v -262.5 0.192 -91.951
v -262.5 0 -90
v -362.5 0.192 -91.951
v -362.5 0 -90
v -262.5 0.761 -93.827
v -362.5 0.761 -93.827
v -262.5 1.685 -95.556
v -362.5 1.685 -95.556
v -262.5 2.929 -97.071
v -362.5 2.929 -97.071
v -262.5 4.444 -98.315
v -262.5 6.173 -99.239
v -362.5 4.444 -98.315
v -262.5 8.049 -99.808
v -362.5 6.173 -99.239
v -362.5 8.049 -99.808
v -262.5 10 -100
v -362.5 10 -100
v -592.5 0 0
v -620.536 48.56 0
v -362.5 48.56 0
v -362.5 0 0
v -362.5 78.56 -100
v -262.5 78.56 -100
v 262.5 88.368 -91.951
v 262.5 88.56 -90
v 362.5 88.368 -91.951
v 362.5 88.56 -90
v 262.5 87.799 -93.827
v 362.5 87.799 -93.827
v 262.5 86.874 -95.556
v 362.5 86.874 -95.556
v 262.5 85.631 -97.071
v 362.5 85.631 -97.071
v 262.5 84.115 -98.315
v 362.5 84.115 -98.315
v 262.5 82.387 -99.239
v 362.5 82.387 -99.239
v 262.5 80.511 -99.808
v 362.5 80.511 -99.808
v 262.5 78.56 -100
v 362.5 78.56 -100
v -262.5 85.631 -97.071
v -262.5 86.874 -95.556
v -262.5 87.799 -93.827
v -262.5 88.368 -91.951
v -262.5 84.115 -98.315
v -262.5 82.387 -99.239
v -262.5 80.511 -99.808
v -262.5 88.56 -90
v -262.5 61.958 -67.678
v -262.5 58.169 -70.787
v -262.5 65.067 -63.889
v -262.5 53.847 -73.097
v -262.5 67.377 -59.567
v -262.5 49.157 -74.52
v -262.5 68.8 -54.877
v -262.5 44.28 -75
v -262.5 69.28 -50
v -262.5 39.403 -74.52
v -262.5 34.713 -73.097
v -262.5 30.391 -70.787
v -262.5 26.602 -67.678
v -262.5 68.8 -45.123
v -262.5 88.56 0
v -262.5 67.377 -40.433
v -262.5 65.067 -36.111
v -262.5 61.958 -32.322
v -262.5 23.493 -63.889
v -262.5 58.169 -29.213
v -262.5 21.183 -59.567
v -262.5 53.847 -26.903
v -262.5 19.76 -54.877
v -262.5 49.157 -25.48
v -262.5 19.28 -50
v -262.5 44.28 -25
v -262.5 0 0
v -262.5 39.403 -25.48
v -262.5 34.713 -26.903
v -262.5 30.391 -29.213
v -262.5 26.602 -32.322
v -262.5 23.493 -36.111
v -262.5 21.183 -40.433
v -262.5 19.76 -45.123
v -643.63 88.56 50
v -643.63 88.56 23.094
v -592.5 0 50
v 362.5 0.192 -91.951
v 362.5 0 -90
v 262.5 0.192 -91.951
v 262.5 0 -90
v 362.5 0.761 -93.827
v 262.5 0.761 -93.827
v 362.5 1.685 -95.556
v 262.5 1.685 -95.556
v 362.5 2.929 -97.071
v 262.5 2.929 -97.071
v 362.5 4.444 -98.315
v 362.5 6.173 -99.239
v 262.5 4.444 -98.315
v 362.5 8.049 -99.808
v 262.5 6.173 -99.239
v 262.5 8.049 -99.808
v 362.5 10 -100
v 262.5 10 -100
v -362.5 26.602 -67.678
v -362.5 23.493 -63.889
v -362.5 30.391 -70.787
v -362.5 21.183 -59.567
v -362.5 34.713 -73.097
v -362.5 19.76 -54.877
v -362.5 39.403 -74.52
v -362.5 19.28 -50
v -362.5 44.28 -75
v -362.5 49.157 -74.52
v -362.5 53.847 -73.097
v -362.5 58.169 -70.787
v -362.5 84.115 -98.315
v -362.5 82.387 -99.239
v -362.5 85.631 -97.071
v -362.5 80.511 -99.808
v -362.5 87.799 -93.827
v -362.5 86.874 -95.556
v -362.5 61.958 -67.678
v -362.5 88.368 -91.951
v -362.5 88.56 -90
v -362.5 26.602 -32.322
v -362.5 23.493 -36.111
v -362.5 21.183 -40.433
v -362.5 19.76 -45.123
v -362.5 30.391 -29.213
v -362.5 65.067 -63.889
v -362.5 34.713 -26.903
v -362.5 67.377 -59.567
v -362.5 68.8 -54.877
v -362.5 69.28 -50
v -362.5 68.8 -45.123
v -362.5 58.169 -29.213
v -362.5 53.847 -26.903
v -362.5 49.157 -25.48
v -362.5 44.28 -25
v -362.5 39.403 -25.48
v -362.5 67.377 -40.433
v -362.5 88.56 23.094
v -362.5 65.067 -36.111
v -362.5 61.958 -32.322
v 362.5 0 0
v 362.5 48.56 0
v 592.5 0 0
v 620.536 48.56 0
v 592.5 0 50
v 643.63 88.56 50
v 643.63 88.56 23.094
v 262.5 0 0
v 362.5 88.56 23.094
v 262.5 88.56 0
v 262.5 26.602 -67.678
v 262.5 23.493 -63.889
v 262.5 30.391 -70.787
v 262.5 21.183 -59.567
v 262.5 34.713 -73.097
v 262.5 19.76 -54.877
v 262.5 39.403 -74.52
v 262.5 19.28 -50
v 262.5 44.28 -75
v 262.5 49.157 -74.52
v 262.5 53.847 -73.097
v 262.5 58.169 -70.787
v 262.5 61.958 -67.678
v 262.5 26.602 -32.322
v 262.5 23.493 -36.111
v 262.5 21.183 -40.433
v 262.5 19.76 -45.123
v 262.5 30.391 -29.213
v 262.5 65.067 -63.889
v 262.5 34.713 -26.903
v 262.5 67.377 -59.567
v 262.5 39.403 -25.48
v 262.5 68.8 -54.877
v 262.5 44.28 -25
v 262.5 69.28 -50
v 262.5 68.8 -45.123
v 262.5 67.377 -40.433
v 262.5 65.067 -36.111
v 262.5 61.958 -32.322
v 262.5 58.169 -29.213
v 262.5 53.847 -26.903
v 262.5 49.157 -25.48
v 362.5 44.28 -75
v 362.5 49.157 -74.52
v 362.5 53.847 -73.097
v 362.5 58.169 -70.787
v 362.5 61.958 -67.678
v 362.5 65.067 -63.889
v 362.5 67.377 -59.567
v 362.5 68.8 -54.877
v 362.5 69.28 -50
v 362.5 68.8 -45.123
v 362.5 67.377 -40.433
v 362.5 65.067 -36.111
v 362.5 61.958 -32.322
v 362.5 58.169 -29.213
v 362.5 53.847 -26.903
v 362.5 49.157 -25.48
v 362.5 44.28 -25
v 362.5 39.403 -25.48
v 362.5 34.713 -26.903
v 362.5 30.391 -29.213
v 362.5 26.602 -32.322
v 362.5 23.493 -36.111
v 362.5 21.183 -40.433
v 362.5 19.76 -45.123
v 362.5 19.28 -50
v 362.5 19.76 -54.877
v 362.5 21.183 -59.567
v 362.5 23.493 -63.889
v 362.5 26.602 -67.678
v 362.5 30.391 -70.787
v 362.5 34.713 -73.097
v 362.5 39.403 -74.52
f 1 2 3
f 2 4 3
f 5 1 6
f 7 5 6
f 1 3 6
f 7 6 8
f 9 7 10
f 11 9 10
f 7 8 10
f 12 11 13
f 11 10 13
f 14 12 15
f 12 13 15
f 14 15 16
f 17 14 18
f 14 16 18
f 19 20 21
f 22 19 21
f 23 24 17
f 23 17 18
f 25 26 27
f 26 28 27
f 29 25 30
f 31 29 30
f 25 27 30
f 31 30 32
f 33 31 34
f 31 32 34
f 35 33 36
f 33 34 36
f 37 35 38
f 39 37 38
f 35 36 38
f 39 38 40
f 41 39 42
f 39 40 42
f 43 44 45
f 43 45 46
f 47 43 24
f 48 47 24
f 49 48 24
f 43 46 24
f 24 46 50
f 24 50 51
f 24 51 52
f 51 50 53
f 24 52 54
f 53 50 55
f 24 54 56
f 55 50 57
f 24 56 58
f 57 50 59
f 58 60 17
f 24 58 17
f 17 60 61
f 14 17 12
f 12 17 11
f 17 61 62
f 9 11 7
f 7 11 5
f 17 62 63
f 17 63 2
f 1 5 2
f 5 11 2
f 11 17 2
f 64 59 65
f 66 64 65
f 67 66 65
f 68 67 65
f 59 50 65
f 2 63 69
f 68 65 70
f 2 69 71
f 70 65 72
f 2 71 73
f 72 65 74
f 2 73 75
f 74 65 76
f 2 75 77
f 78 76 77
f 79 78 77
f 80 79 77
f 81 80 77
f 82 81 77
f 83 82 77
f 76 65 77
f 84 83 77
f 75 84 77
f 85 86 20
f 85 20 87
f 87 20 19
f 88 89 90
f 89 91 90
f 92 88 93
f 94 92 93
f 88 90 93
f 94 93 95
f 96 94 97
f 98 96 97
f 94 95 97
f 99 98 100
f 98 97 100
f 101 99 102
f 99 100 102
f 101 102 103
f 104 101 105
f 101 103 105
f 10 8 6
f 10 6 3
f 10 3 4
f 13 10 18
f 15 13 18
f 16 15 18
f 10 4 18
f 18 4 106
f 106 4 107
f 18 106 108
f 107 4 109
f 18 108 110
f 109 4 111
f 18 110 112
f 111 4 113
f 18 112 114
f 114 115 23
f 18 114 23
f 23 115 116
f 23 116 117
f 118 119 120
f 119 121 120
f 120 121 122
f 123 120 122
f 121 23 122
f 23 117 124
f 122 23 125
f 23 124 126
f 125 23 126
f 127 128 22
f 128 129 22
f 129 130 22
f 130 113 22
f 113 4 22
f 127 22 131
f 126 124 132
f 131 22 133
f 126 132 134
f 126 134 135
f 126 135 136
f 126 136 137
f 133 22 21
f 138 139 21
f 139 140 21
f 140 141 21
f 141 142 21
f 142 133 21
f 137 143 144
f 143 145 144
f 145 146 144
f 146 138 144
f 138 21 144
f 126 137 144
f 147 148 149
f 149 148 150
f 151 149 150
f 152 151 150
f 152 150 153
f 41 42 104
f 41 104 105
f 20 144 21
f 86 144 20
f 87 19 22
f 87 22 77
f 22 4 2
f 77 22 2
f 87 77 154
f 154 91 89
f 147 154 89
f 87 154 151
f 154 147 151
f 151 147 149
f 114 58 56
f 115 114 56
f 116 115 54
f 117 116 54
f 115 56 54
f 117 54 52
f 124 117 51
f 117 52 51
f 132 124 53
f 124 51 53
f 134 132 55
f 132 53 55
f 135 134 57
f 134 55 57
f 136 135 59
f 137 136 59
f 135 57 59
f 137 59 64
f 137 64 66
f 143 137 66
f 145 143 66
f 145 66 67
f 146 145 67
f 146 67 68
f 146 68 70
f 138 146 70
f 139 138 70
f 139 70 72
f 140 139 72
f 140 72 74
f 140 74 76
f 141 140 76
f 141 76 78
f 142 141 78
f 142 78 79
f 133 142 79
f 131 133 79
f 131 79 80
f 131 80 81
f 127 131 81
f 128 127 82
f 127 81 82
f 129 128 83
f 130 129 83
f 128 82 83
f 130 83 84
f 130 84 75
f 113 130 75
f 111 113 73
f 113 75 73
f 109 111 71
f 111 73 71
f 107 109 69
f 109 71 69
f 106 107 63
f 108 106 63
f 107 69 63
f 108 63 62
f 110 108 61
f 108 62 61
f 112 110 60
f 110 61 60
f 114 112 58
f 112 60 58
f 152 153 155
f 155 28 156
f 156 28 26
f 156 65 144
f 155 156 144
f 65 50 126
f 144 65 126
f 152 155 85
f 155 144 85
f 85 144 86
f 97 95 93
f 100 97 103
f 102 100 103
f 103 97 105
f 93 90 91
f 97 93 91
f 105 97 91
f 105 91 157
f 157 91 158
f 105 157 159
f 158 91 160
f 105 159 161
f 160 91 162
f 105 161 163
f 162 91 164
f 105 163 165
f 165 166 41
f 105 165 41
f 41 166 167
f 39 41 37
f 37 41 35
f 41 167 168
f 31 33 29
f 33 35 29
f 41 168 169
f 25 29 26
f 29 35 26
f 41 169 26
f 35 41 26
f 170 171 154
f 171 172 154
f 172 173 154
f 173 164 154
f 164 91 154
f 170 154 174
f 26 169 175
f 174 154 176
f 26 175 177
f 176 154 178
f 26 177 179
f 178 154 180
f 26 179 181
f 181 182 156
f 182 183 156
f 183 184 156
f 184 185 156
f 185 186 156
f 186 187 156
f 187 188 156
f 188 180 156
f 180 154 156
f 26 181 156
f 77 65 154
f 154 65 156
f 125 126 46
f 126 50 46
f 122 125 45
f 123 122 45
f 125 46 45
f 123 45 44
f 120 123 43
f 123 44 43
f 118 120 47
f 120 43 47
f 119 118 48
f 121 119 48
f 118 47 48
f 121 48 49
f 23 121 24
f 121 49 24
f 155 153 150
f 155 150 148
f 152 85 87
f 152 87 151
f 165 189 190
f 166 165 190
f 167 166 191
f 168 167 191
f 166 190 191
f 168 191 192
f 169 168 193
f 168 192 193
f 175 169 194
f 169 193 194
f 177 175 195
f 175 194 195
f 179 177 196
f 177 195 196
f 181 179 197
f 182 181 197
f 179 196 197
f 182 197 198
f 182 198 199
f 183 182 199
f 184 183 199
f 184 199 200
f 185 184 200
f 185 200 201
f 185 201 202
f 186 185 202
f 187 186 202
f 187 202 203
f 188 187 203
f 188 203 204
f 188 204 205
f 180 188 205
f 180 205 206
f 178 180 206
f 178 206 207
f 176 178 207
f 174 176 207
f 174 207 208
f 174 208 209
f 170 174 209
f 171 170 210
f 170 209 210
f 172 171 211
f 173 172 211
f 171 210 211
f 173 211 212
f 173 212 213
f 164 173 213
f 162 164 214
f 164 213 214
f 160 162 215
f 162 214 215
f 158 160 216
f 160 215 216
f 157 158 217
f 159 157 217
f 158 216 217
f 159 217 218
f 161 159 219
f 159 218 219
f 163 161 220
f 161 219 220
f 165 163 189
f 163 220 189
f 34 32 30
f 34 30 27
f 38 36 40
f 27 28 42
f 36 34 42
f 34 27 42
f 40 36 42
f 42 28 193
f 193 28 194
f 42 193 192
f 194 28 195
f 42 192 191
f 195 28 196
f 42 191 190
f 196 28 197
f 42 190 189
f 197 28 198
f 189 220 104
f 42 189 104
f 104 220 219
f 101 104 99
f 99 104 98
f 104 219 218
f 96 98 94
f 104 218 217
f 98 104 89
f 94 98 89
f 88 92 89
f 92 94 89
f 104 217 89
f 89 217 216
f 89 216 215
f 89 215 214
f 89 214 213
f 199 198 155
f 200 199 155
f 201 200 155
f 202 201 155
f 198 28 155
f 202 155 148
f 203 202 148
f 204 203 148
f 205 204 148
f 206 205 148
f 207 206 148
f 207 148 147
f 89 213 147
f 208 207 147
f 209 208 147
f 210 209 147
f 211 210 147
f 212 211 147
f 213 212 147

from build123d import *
from OCP.BRepFilletAPI import BRepFilletAPI_MakeChamfer

# Parameters (mm, degrees)
BOSS_EXTRUDE1_DEPTH = 50
BOSS_EXTRUDE2_DEPTH = 100
SKETCH3_R           = 25
CUT_EXTRUDE1_DEPTH  = 1015.958328012
FILLET1_R           = 10
CHAMFER1_SIZE       = 40
CHAMFER1_SIZE2      = 23.094010768


with BuildPart() as part:
    # Sketch1 → Boss-Extrude1 (new body)
    with BuildSketch(Plane.XY):
        Polygon((0, 0), (592.5, 0), (643.63, 88.559757791), (-643.63, 88.559757791), (-592.5, 0), align=None)
    extrude(amount=BOSS_EXTRUDE1_DEPTH)

    # Sketch2 → Boss-Extrude2 (add)
    with BuildSketch(Plane(origin=(0, 0, 0), x_dir=(-1, 0, 0), z_dir=(0, 0, -1))):
        Polygon((-312.5, 0), (-262.5, 0), (-262.5, 88.559757791), (-362.5, 88.559757791), (-362.5, 0), align=None)
        Polygon((262.5, 88.559757791), (262.5, 0), (312.5, 0), (362.5, 0), (362.5, 88.559757791), align=None)
    extrude(amount=BOSS_EXTRUDE2_DEPTH)

    # Sketch3 → Cut-Extrude1 (cut, through all)
    with BuildSketch(Plane(origin=(362.5, 0, 0), x_dir=(0, 0, -1), z_dir=(1, 0, 0))):
        with Locations((50, 44.279878895)):
            Circle(SKETCH3_R)
    extrude(amount=-CUT_EXTRUDE1_DEPTH, mode=Mode.SUBTRACT)

    # Fillet1
    fillet1_edges = [part.edges().sort_by_distance(p)[0] for p in [
        (-312.5, 88.559757791, -100),
        (-312.5, 0, -100),
        (312.5, 88.559757791, -100),
        (312.5, 0, -100),
    ]]
    fillet(fillet1_edges, radius=FILLET1_R)

    # Chamfer1: one chamfer whose edges measure the first distance from different faces: ONE call of the kernel's chamfer builder (chamfer() names one face for all edges)
    chamfer1_edges_1 = [part.edges().sort_by_distance(p)[0] for p in [
        (-503.065, 88.559757791, 0),
    ]]
    chamfer1_side_1 = [part.faces().sort_by_distance(p)[0] for p in [
        (-490.708725047, 45.75636577, 0),
    ]]
    chamfer1_edges_2 = [part.edges().sort_by_distance(p)[0] for p in [
        (503.065, 88.559757791, 0),
    ]]
    chamfer1_side_2 = [part.faces().sort_by_distance(p)[0] for p in [
        (490.708725047, 45.75636577, 0),
    ]]
    chamfer1 = BRepFilletAPI_MakeChamfer(part.part.solid().wrapped)
    for e in chamfer1_edges_1:
        chamfer1.Add(CHAMFER1_SIZE, CHAMFER1_SIZE2, e.wrapped, chamfer1_side_1[0].wrapped)  # the first distance lies on this face
    for e in chamfer1_edges_2:
        chamfer1.Add(CHAMFER1_SIZE, CHAMFER1_SIZE2, e.wrapped, chamfer1_side_2[0].wrapped)  # the first distance lies on this face
    add(Compound.cast(chamfer1.Shape()), mode=Mode.REPLACE)


solid = part.part
